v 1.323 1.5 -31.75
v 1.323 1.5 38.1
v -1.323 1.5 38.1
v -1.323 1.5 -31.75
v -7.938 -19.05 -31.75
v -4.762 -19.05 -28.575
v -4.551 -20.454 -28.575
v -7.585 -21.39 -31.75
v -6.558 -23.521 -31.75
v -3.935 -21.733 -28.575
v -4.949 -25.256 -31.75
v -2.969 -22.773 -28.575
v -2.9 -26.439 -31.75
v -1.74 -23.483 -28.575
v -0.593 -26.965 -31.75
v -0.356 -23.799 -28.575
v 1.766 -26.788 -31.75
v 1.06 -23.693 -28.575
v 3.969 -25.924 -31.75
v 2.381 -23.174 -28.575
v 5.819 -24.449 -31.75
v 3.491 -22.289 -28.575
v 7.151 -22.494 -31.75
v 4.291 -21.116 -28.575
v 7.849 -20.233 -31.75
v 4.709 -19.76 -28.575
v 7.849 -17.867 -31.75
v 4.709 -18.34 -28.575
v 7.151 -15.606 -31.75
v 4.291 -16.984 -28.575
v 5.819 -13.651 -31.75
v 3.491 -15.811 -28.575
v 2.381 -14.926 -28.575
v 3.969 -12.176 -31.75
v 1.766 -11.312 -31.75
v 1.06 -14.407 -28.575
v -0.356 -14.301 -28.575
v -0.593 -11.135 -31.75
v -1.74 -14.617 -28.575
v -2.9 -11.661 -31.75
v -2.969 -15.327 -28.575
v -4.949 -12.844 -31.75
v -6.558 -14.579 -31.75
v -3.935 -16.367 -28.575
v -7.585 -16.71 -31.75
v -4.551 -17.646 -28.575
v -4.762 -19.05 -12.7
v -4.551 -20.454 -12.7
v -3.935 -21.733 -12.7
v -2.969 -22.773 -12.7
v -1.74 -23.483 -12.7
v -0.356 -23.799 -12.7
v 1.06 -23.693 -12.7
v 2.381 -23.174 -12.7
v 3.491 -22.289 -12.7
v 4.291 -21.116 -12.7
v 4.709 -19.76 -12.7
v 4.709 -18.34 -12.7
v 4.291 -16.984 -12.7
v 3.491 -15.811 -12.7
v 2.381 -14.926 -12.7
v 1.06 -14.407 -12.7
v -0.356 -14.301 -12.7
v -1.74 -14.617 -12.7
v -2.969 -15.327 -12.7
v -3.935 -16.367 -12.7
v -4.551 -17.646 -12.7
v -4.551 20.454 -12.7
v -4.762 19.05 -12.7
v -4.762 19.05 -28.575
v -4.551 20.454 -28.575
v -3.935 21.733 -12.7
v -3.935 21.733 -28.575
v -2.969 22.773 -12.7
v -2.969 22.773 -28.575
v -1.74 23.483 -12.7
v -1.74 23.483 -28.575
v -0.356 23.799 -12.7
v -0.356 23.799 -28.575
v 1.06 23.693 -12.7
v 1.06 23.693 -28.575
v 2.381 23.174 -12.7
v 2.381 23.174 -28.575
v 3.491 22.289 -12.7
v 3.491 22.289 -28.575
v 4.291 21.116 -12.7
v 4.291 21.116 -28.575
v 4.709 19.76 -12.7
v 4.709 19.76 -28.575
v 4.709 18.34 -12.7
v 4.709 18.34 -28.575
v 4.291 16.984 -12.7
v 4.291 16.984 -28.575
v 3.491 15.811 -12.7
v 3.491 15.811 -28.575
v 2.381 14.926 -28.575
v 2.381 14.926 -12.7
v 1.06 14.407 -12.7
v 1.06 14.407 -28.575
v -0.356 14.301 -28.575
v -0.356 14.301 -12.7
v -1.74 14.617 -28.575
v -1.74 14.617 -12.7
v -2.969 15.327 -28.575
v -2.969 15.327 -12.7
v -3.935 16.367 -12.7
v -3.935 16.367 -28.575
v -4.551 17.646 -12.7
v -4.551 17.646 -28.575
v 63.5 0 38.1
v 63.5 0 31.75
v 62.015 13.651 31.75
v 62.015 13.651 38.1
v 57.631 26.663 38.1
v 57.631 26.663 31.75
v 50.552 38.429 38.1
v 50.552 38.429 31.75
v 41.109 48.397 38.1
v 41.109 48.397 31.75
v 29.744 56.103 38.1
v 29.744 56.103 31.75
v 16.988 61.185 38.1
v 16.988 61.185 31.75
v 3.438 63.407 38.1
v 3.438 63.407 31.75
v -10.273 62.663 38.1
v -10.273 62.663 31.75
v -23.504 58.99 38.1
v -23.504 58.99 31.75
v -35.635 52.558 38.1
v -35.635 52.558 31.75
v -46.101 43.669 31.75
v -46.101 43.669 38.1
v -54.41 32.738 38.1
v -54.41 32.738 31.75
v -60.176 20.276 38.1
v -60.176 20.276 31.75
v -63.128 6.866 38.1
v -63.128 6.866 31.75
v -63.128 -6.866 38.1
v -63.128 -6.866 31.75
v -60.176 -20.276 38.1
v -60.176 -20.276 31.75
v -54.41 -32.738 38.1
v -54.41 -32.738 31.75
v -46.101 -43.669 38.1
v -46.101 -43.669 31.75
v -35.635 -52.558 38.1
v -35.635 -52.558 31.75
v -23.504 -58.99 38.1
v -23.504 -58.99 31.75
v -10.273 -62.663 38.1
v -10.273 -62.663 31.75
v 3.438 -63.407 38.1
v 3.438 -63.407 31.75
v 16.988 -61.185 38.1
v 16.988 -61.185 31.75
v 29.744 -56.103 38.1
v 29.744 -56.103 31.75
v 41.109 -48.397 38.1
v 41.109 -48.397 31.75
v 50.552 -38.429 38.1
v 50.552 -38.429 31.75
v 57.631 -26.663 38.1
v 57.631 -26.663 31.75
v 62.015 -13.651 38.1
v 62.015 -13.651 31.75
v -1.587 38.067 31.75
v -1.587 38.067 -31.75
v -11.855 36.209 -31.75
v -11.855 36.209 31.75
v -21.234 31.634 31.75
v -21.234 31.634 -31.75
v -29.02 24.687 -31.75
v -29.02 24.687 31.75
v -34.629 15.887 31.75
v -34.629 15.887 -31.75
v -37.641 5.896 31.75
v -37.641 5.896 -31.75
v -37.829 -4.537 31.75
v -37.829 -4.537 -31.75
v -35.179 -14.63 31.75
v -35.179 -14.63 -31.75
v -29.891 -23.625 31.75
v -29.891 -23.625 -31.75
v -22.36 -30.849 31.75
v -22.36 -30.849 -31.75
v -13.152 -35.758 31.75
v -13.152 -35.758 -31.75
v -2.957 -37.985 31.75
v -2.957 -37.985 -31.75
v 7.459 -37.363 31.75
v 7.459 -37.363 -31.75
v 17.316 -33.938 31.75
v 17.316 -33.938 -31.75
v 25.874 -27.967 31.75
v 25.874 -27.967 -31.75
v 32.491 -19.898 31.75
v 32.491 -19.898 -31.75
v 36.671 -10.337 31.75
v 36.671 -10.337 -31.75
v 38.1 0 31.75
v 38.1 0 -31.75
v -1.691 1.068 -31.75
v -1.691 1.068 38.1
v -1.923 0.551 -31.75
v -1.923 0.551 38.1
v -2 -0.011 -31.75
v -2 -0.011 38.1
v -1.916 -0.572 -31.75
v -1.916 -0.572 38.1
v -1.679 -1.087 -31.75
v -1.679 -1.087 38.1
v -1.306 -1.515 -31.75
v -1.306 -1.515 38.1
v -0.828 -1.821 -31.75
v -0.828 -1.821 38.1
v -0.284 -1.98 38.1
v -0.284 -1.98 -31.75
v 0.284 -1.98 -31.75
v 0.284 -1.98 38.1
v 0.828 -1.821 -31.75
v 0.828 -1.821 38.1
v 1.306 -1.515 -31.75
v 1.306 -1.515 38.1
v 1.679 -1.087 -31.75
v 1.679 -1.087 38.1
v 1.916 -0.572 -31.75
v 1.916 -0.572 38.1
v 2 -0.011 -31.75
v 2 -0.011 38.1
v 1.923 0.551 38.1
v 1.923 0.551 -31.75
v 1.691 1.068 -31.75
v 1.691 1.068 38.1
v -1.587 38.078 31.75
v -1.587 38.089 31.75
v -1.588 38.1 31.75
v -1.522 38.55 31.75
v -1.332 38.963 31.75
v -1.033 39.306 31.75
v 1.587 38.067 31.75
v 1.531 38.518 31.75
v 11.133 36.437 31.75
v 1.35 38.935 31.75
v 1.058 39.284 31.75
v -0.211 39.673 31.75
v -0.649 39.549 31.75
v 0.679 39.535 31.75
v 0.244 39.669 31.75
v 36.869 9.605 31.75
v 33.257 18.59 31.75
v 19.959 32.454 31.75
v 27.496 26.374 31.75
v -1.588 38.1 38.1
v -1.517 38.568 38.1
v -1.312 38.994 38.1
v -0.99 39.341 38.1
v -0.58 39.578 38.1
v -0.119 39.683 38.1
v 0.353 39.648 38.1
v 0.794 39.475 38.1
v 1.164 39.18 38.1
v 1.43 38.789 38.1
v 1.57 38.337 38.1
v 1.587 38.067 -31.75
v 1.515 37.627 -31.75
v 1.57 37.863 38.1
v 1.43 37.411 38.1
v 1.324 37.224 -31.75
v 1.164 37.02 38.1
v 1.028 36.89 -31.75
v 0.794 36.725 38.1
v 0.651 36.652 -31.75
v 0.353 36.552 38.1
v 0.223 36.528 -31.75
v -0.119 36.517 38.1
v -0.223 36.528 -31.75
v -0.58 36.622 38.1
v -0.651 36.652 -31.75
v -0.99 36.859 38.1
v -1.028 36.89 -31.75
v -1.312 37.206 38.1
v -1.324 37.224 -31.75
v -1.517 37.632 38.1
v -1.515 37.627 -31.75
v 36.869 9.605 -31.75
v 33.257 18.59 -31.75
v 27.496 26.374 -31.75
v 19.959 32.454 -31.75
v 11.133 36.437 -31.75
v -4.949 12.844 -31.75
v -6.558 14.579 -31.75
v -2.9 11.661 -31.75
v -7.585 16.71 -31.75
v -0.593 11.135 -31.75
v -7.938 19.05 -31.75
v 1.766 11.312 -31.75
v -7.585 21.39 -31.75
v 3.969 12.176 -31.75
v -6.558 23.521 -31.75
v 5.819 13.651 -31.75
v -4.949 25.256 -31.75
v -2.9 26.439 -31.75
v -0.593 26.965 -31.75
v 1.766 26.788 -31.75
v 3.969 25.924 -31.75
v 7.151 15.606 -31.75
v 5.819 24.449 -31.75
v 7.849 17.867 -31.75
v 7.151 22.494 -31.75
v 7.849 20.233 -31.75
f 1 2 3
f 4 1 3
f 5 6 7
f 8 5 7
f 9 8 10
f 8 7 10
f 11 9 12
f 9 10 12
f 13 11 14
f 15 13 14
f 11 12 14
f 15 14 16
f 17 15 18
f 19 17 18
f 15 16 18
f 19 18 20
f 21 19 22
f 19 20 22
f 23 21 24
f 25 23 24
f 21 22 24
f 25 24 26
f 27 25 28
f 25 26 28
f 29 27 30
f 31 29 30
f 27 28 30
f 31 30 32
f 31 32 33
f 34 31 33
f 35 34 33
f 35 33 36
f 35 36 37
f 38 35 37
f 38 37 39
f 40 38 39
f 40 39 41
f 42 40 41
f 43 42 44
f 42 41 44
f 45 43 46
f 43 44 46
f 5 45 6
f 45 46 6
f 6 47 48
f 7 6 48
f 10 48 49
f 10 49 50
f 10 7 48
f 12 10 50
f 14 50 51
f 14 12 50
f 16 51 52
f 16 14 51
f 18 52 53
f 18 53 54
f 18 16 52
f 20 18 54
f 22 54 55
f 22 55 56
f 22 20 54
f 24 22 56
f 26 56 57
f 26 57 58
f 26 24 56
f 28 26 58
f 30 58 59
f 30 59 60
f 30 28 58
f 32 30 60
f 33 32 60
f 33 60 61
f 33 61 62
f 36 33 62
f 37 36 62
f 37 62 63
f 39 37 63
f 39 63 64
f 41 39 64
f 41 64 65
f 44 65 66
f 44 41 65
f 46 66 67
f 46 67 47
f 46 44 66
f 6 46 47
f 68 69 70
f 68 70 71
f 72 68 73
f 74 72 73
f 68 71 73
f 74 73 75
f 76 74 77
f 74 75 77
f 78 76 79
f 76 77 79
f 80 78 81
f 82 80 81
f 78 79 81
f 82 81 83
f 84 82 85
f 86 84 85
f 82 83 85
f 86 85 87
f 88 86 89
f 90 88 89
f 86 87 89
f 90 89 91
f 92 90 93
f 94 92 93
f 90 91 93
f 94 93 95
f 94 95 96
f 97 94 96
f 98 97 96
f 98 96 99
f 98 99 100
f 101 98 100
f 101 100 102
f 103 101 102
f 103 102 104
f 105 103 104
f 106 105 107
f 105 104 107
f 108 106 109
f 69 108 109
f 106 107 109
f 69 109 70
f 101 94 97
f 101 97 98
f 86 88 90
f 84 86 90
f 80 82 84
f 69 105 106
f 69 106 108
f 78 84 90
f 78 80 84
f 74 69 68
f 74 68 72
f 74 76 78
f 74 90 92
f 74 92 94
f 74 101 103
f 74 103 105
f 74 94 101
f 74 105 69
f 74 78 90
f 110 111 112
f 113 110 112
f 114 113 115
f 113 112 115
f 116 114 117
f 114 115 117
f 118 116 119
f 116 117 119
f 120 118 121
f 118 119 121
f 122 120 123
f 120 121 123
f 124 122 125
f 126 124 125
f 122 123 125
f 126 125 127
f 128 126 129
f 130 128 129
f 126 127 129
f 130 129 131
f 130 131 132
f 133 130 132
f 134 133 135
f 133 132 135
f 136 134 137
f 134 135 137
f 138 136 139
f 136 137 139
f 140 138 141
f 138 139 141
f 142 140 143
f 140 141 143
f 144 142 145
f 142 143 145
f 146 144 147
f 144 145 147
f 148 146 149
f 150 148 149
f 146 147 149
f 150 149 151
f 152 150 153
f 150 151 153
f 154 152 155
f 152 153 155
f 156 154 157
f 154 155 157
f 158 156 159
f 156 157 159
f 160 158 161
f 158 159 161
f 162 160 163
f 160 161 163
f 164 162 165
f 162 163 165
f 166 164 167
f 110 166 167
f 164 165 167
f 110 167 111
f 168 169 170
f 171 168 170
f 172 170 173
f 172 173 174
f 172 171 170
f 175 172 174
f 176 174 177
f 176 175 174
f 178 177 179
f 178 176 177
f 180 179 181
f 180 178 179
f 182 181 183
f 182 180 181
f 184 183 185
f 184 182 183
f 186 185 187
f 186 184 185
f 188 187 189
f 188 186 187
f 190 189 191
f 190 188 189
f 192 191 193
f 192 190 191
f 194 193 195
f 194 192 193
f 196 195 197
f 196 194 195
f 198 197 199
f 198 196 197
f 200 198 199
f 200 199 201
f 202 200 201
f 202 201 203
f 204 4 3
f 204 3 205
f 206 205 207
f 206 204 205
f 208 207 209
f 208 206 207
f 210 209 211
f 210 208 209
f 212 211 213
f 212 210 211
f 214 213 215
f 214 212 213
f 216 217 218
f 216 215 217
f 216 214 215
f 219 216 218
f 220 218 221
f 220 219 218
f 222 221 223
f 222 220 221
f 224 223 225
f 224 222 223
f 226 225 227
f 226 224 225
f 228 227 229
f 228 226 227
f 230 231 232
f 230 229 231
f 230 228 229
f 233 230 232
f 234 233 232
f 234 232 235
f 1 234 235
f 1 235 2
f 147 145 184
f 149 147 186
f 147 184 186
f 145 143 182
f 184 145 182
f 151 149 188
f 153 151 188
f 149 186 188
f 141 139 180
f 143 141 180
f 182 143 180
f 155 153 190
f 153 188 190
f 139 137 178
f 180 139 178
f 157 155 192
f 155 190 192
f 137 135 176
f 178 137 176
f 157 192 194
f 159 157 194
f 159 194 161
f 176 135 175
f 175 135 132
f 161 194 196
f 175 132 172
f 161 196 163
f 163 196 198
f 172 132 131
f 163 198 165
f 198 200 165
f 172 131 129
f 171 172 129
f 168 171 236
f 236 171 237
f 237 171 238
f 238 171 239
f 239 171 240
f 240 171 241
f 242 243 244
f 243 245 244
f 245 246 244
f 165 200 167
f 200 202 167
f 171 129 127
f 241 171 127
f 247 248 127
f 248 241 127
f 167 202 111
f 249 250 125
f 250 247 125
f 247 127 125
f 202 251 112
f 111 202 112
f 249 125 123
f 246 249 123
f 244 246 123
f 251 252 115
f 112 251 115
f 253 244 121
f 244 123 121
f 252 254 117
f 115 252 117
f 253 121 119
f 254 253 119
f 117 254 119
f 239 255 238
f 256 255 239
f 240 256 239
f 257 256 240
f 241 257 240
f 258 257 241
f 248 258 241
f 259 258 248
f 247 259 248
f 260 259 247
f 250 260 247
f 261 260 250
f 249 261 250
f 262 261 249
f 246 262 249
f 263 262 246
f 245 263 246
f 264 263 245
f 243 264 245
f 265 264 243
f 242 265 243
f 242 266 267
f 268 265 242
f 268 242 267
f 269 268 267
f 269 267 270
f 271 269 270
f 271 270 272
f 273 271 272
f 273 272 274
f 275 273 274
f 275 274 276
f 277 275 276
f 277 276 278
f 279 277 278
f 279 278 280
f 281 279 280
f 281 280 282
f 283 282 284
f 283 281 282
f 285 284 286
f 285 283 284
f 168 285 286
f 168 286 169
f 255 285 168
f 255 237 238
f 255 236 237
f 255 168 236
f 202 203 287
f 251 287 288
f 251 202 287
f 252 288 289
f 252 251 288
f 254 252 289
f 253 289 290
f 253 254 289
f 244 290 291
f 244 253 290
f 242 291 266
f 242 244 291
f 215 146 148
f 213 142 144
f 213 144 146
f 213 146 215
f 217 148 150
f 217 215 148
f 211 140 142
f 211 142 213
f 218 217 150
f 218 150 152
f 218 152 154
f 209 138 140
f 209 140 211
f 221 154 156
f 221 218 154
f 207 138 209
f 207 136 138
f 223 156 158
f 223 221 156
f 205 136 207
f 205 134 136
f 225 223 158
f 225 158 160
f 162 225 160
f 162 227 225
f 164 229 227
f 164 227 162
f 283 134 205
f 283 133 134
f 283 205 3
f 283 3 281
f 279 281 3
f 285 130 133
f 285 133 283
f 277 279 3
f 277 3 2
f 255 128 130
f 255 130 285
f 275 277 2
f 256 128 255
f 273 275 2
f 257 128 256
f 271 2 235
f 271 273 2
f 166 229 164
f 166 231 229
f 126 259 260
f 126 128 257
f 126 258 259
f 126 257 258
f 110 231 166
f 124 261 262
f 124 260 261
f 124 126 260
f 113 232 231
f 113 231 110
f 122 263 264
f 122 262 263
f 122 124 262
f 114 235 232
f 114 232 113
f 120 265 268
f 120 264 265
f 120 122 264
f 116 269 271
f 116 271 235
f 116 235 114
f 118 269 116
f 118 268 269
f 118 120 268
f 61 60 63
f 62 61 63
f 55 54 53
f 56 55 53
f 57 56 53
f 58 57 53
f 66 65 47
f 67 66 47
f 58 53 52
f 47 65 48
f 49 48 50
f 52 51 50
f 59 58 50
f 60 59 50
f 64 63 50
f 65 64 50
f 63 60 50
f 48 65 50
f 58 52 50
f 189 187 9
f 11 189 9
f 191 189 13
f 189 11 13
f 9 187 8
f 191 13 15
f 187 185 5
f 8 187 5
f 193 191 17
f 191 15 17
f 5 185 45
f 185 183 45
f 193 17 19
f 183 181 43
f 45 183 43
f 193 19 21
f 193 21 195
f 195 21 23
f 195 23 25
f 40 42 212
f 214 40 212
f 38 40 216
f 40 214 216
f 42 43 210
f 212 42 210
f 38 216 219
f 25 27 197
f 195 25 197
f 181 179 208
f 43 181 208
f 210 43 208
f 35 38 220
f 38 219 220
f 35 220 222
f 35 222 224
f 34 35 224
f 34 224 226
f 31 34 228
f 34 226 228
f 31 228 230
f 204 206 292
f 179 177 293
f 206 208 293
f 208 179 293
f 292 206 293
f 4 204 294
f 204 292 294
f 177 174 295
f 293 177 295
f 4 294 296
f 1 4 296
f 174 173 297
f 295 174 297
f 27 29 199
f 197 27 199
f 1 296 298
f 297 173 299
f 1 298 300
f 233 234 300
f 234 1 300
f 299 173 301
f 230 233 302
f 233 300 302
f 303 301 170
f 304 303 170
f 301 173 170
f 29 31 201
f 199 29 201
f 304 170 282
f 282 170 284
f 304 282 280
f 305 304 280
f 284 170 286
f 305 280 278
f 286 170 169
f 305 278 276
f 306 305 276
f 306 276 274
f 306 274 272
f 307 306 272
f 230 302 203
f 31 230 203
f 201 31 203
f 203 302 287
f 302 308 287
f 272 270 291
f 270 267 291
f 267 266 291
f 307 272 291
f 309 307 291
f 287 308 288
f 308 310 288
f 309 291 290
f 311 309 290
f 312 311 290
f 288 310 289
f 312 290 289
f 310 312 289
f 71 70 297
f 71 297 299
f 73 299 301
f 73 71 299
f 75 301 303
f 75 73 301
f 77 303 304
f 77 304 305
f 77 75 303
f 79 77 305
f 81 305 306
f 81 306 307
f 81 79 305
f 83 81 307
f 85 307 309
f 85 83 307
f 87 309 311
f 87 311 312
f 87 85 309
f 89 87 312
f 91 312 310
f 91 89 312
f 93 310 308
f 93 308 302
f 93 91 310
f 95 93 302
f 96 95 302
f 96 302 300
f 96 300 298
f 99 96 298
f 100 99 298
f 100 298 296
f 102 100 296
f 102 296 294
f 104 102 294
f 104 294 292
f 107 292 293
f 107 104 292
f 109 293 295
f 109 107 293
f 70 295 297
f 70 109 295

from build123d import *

# Parameters (mm, degrees)
SKETCH2_R                = 38.1
BOSS_EXTRUDE1_DEPTH      = 31.75
SKETCH5_R                = 63.5
BOSS_EXTRUDE2_DEPTH      = 6.35
CUT_EXTRUDE1_DEPTH       = 110.985226281
CUT_EXTRUDE1_DEPTH_BACK  = 110.985226281
SKETCH7_R                = 1.5875
CUT_EXTRUDE2_DEPTH       = 114.769602707
SKETCH9_R                = 4.7625
CUT_EXTRUDE3_DEPTH       = 19.05
CHAMFER1_SIZE            = 3.175
CHAMFER1_OF_MIRROR1_SIZE = 3.175


with BuildPart() as part:
    # Sketch2 → Boss-Extrude1 (new, symmetric)
    with BuildSketch(Plane.XY):
        Circle(SKETCH2_R)
    extrude(amount=BOSS_EXTRUDE1_DEPTH, both=True)

    # Sketch5 → Boss-Extrude2 (add)
    with BuildSketch(Plane.XY.offset(31.75)):
        Circle(SKETCH5_R)
    extrude(amount=BOSS_EXTRUDE2_DEPTH)

    # Sketch7 → Cut-Extrude1 (cut, two sides: drawn at the far end of the back side and taken through both)
    with BuildSketch(Plane(origin=(0, 0, 31.75), x_dir=(-1, 0, 0), z_dir=(0, 0, -1)).offset(-CUT_EXTRUDE1_DEPTH_BACK)):
        with Locations((0, 38.1)):
            Circle(SKETCH7_R)
    extrude(amount=CUT_EXTRUDE1_DEPTH + CUT_EXTRUDE1_DEPTH_BACK, mode=Mode.SUBTRACT)

    # Sketch8 → Cut-Extrude2 (cut, through all)
    with BuildSketch(Plane(origin=(0, 0, -31.75), x_dir=(-1, 0, 0), z_dir=(0, 0, -1))):
        with BuildLine():
            Line((-1.322875656, 1.5), (1.322875656, 1.5))
            ThreePointArc((1.322875656, 1.5), (0, -2), (-1.322875656, 1.5))
        make_face()
    extrude(amount=-CUT_EXTRUDE2_DEPTH, mode=Mode.SUBTRACT)

    # Sketch9 → Cut-Extrude3 (cut)
    with BuildSketch(Plane(origin=(0, 0, -31.75), x_dir=(-1, 0, 0), z_dir=(0, 0, -1))):
        with Locations((0, 19.05)):
            Circle(SKETCH9_R)
    cut_extrude3 = extrude(amount=-CUT_EXTRUDE3_DEPTH, mode=Mode.SUBTRACT)

    # Chamfer1
    chamfer1_edges = [part.edges().sort_by_distance(p)[0] for p in [
        (4.7625, 19.05, -31.75),
    ]]
    chamfer(chamfer1_edges, length=CHAMFER1_SIZE)

    # Mirror1: Cut-Extrude3 across plane
    add(cut_extrude3.mirror(Plane.ZX), mode=Mode.SUBTRACT)

    # Chamfer1 of Mirror1
    chamfer1_of_mirror1_edges = [part.edges().sort_by_distance(p)[0] for p in [
        (4.7625, -19.05, -31.75),
    ]]
    chamfer(chamfer1_of_mirror1_edges, length=CHAMFER1_OF_MIRROR1_SIZE)


solid = part.part
